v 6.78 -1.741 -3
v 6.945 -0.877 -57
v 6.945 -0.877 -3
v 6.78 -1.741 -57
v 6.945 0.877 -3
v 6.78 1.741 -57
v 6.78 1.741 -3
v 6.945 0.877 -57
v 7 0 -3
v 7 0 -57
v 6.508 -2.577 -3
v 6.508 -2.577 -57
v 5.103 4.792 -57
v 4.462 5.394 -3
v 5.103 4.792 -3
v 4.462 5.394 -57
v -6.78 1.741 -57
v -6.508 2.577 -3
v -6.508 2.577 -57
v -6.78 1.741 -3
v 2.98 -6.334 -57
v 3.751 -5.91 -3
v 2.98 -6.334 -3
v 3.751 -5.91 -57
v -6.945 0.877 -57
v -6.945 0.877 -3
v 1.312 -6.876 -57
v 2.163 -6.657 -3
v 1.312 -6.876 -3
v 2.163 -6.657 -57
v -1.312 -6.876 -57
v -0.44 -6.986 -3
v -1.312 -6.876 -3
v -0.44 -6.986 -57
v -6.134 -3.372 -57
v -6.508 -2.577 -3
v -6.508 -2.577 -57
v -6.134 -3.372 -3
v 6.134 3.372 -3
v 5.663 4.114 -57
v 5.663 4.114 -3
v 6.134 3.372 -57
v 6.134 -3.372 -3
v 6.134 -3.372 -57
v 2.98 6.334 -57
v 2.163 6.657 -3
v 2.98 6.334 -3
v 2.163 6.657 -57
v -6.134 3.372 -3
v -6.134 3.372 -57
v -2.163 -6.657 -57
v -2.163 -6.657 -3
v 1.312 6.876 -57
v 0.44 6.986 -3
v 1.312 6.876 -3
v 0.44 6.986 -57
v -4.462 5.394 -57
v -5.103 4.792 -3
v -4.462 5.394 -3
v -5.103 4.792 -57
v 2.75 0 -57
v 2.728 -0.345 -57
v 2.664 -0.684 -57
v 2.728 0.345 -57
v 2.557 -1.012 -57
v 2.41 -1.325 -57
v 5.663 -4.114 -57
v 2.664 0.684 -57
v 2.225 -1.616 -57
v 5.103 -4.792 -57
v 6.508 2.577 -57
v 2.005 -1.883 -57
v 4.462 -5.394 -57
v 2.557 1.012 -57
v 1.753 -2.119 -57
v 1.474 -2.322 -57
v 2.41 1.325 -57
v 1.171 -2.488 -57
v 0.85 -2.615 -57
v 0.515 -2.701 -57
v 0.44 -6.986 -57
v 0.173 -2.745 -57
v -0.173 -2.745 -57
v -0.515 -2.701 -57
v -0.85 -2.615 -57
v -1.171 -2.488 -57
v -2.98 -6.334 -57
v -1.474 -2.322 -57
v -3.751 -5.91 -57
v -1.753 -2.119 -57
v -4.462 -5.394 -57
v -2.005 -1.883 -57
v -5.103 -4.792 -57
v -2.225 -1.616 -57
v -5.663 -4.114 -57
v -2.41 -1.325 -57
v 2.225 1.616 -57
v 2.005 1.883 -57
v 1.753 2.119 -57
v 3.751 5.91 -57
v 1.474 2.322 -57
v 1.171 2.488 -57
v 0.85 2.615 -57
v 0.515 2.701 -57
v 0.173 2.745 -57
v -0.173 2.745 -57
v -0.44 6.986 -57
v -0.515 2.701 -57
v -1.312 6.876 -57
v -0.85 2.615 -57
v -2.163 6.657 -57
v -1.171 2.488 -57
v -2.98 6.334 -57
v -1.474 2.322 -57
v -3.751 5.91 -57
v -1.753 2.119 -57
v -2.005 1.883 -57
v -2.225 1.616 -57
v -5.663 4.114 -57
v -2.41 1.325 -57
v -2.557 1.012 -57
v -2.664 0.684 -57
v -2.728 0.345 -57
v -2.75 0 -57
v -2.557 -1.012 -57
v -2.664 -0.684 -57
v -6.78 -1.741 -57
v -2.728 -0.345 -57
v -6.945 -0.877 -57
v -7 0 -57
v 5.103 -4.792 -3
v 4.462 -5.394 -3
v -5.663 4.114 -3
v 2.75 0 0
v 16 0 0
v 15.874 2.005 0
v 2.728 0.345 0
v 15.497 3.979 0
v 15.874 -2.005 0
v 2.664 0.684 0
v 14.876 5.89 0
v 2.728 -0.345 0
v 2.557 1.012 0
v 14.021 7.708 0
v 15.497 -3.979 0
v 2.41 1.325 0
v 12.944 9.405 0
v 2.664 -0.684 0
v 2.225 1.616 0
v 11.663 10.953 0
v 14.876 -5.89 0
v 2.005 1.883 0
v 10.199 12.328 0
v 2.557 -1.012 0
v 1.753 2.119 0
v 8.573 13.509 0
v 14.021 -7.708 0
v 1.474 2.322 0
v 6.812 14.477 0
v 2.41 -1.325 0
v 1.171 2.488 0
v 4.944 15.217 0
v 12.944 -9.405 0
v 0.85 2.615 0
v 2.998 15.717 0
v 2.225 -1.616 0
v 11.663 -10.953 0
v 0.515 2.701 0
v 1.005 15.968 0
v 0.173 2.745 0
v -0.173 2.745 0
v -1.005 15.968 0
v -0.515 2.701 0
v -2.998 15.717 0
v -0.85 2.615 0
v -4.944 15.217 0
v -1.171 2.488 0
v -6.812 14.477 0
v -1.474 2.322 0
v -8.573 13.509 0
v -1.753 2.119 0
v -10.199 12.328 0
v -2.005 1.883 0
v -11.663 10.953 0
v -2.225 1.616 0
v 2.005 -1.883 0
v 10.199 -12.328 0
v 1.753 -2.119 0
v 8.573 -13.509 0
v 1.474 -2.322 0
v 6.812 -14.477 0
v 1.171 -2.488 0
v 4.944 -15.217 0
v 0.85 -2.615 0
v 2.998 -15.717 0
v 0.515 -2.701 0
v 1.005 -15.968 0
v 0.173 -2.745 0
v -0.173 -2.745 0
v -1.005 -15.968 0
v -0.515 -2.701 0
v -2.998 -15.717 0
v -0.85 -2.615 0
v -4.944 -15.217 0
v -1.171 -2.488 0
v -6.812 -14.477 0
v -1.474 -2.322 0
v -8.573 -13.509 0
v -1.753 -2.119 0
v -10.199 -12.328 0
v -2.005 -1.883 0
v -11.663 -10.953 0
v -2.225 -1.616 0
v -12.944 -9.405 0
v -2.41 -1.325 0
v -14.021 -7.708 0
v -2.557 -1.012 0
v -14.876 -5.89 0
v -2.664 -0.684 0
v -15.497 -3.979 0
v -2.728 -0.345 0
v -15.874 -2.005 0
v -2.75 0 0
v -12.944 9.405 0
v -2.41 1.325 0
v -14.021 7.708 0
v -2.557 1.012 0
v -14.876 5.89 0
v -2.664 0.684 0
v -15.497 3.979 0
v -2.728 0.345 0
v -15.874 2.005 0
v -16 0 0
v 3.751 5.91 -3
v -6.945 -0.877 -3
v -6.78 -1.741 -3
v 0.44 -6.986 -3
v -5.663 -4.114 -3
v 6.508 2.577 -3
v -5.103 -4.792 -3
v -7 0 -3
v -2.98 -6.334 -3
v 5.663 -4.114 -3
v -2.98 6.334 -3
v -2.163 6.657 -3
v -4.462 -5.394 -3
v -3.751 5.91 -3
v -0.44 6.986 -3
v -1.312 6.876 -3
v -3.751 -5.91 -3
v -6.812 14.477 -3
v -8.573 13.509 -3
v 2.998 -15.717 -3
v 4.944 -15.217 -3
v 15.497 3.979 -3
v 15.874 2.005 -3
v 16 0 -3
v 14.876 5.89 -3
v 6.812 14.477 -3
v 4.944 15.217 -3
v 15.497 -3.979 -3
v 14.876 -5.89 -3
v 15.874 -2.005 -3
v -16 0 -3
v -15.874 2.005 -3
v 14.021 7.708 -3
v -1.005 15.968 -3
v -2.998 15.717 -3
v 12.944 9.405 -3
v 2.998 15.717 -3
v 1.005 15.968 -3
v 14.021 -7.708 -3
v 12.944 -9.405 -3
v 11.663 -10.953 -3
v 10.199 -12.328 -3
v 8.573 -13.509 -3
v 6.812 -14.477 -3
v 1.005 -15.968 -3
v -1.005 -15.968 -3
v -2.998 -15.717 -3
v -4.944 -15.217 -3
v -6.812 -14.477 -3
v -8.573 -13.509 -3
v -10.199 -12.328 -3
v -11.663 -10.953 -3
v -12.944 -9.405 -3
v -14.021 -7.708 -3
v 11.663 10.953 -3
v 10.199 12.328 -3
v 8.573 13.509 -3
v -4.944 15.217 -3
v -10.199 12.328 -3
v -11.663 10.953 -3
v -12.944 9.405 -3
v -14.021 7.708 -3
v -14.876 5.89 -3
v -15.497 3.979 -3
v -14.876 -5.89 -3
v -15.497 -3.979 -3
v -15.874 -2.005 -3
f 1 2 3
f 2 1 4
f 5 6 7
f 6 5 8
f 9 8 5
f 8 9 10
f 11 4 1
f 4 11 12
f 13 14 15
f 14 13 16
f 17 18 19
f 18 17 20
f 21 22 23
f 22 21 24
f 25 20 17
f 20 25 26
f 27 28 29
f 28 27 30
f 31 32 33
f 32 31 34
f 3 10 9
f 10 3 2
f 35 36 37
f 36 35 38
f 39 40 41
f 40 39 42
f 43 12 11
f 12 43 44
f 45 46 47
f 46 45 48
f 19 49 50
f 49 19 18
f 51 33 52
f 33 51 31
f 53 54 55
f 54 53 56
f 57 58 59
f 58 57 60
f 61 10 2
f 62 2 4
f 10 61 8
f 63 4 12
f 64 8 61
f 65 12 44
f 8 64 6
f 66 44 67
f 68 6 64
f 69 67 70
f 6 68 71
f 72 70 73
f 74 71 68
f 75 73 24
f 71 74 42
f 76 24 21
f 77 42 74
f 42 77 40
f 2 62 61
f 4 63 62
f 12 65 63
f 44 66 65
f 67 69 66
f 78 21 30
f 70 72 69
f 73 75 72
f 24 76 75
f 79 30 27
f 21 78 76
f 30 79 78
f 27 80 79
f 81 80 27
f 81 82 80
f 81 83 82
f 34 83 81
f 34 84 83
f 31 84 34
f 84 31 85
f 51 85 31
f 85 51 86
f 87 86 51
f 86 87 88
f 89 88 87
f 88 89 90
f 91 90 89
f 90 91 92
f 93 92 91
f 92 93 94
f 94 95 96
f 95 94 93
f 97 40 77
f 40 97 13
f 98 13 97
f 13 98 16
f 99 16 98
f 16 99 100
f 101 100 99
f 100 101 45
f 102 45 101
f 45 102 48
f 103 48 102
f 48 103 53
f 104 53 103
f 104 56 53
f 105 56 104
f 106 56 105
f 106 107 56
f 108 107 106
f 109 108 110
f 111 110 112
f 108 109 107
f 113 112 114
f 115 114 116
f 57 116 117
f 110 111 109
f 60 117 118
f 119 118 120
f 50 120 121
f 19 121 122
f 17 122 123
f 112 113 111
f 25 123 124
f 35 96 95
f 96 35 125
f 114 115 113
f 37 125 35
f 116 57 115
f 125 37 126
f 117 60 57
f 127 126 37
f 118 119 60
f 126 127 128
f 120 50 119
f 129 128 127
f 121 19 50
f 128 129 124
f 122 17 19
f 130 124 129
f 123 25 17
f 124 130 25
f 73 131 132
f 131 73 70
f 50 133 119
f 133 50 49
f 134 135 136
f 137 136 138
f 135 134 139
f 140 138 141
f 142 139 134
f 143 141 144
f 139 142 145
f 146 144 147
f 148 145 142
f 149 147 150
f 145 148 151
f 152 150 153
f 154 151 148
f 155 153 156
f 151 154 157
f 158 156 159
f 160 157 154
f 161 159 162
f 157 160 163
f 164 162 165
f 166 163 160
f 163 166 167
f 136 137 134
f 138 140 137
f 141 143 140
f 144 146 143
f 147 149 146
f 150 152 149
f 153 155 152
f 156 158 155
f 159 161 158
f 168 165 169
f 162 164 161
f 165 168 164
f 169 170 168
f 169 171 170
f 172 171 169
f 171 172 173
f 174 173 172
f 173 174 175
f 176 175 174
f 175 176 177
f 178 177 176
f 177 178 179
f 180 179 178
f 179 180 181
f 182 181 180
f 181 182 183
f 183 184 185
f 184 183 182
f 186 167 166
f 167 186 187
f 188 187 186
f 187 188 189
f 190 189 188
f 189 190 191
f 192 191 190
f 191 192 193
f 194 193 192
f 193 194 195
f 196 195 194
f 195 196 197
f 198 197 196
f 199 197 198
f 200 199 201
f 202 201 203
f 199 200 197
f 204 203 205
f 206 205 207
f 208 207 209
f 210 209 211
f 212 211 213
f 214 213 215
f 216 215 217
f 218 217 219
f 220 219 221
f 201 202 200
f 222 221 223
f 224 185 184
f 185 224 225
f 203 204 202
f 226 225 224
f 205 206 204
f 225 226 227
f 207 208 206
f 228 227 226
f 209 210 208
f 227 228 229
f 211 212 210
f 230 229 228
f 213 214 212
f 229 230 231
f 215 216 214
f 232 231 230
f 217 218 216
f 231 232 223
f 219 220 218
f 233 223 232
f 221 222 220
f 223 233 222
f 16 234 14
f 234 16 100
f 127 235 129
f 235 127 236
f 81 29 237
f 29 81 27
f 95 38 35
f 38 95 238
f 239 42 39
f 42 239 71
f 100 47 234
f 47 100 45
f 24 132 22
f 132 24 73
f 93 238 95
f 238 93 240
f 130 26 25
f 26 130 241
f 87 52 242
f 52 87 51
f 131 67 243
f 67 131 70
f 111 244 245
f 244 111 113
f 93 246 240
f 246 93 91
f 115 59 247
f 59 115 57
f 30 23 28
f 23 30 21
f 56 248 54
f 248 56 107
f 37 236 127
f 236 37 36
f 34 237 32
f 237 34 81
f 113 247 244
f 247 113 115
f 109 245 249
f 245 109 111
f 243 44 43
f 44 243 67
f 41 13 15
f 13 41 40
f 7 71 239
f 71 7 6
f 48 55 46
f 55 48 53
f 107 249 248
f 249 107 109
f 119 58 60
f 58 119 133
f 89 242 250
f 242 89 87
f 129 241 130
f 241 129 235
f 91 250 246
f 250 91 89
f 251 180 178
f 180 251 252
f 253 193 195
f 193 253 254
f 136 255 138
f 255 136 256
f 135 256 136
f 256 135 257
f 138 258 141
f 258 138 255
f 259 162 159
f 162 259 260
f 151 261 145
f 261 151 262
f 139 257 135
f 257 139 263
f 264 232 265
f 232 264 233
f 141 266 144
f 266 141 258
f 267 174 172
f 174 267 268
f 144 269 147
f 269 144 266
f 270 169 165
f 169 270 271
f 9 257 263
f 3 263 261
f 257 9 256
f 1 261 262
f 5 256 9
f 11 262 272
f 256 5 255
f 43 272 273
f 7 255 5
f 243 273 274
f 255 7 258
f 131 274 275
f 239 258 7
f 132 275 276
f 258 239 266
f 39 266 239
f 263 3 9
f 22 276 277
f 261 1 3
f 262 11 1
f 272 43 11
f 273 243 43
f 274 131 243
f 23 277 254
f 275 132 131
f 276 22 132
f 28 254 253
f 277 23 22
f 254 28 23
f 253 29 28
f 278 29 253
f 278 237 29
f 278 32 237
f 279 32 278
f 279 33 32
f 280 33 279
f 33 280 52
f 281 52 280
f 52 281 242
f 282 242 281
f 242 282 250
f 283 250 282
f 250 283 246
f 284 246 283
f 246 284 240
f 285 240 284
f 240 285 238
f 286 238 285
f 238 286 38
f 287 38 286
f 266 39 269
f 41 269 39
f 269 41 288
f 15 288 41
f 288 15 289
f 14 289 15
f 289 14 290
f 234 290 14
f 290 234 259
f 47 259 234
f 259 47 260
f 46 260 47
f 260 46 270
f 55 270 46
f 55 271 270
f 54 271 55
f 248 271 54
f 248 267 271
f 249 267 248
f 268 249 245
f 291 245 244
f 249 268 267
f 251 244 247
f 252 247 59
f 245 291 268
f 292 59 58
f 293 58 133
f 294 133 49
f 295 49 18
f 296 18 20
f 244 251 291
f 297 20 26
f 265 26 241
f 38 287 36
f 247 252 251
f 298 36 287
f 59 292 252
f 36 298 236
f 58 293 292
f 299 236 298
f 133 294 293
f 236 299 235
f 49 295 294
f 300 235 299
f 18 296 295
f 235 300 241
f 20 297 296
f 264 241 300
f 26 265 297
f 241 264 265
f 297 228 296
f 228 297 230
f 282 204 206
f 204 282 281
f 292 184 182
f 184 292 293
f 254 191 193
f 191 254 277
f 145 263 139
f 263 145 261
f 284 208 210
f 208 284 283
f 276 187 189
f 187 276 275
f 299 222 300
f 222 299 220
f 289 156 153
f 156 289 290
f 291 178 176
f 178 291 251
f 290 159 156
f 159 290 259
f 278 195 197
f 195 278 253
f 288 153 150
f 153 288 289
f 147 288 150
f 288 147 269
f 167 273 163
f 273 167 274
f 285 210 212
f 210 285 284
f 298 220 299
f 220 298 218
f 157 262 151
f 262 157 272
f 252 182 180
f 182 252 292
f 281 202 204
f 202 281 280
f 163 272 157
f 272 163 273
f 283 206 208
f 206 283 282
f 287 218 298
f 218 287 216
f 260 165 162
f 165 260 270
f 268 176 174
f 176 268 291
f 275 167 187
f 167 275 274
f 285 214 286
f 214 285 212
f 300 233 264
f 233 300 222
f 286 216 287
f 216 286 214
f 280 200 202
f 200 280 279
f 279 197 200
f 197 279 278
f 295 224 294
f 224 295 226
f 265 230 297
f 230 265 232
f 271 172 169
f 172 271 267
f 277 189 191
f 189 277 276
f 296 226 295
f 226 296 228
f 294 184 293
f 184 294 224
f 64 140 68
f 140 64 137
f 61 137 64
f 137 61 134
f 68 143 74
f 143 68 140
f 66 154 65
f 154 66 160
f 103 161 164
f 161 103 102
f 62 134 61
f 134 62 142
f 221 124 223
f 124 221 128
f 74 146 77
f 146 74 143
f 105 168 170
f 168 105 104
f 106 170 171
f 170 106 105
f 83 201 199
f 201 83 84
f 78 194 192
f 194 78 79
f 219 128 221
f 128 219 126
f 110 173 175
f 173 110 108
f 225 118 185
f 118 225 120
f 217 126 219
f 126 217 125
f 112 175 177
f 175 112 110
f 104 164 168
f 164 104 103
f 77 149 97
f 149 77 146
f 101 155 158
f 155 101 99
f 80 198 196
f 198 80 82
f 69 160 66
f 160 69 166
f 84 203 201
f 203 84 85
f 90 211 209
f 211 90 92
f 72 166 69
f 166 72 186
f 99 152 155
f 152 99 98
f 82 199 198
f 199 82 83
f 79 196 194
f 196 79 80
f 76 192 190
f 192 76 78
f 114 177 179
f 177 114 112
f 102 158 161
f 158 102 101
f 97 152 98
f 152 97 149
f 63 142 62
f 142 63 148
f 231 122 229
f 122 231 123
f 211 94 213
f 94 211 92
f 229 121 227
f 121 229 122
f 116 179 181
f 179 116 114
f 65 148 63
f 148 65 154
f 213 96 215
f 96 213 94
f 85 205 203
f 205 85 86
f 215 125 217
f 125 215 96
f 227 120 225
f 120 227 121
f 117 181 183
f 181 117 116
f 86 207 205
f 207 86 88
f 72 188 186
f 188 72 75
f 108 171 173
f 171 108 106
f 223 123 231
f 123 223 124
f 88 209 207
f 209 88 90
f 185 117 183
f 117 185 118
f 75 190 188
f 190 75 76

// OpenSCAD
$fn = 50;


difference() {
	union() {
		translate(v = [0, 0, -57.0000000000]) {
			cylinder(h = 57, r = 7.0000000000);
		}
		translate(v = [0, 0, -3.0000000000]) {
			cylinder(h = 3, r = 16.0000000000);
		}
	}
	union() {
		#translate(v = [0, 0, -57]) {
			cylinder(h = 57, r = 2.7500000000);
		}
	}
}
